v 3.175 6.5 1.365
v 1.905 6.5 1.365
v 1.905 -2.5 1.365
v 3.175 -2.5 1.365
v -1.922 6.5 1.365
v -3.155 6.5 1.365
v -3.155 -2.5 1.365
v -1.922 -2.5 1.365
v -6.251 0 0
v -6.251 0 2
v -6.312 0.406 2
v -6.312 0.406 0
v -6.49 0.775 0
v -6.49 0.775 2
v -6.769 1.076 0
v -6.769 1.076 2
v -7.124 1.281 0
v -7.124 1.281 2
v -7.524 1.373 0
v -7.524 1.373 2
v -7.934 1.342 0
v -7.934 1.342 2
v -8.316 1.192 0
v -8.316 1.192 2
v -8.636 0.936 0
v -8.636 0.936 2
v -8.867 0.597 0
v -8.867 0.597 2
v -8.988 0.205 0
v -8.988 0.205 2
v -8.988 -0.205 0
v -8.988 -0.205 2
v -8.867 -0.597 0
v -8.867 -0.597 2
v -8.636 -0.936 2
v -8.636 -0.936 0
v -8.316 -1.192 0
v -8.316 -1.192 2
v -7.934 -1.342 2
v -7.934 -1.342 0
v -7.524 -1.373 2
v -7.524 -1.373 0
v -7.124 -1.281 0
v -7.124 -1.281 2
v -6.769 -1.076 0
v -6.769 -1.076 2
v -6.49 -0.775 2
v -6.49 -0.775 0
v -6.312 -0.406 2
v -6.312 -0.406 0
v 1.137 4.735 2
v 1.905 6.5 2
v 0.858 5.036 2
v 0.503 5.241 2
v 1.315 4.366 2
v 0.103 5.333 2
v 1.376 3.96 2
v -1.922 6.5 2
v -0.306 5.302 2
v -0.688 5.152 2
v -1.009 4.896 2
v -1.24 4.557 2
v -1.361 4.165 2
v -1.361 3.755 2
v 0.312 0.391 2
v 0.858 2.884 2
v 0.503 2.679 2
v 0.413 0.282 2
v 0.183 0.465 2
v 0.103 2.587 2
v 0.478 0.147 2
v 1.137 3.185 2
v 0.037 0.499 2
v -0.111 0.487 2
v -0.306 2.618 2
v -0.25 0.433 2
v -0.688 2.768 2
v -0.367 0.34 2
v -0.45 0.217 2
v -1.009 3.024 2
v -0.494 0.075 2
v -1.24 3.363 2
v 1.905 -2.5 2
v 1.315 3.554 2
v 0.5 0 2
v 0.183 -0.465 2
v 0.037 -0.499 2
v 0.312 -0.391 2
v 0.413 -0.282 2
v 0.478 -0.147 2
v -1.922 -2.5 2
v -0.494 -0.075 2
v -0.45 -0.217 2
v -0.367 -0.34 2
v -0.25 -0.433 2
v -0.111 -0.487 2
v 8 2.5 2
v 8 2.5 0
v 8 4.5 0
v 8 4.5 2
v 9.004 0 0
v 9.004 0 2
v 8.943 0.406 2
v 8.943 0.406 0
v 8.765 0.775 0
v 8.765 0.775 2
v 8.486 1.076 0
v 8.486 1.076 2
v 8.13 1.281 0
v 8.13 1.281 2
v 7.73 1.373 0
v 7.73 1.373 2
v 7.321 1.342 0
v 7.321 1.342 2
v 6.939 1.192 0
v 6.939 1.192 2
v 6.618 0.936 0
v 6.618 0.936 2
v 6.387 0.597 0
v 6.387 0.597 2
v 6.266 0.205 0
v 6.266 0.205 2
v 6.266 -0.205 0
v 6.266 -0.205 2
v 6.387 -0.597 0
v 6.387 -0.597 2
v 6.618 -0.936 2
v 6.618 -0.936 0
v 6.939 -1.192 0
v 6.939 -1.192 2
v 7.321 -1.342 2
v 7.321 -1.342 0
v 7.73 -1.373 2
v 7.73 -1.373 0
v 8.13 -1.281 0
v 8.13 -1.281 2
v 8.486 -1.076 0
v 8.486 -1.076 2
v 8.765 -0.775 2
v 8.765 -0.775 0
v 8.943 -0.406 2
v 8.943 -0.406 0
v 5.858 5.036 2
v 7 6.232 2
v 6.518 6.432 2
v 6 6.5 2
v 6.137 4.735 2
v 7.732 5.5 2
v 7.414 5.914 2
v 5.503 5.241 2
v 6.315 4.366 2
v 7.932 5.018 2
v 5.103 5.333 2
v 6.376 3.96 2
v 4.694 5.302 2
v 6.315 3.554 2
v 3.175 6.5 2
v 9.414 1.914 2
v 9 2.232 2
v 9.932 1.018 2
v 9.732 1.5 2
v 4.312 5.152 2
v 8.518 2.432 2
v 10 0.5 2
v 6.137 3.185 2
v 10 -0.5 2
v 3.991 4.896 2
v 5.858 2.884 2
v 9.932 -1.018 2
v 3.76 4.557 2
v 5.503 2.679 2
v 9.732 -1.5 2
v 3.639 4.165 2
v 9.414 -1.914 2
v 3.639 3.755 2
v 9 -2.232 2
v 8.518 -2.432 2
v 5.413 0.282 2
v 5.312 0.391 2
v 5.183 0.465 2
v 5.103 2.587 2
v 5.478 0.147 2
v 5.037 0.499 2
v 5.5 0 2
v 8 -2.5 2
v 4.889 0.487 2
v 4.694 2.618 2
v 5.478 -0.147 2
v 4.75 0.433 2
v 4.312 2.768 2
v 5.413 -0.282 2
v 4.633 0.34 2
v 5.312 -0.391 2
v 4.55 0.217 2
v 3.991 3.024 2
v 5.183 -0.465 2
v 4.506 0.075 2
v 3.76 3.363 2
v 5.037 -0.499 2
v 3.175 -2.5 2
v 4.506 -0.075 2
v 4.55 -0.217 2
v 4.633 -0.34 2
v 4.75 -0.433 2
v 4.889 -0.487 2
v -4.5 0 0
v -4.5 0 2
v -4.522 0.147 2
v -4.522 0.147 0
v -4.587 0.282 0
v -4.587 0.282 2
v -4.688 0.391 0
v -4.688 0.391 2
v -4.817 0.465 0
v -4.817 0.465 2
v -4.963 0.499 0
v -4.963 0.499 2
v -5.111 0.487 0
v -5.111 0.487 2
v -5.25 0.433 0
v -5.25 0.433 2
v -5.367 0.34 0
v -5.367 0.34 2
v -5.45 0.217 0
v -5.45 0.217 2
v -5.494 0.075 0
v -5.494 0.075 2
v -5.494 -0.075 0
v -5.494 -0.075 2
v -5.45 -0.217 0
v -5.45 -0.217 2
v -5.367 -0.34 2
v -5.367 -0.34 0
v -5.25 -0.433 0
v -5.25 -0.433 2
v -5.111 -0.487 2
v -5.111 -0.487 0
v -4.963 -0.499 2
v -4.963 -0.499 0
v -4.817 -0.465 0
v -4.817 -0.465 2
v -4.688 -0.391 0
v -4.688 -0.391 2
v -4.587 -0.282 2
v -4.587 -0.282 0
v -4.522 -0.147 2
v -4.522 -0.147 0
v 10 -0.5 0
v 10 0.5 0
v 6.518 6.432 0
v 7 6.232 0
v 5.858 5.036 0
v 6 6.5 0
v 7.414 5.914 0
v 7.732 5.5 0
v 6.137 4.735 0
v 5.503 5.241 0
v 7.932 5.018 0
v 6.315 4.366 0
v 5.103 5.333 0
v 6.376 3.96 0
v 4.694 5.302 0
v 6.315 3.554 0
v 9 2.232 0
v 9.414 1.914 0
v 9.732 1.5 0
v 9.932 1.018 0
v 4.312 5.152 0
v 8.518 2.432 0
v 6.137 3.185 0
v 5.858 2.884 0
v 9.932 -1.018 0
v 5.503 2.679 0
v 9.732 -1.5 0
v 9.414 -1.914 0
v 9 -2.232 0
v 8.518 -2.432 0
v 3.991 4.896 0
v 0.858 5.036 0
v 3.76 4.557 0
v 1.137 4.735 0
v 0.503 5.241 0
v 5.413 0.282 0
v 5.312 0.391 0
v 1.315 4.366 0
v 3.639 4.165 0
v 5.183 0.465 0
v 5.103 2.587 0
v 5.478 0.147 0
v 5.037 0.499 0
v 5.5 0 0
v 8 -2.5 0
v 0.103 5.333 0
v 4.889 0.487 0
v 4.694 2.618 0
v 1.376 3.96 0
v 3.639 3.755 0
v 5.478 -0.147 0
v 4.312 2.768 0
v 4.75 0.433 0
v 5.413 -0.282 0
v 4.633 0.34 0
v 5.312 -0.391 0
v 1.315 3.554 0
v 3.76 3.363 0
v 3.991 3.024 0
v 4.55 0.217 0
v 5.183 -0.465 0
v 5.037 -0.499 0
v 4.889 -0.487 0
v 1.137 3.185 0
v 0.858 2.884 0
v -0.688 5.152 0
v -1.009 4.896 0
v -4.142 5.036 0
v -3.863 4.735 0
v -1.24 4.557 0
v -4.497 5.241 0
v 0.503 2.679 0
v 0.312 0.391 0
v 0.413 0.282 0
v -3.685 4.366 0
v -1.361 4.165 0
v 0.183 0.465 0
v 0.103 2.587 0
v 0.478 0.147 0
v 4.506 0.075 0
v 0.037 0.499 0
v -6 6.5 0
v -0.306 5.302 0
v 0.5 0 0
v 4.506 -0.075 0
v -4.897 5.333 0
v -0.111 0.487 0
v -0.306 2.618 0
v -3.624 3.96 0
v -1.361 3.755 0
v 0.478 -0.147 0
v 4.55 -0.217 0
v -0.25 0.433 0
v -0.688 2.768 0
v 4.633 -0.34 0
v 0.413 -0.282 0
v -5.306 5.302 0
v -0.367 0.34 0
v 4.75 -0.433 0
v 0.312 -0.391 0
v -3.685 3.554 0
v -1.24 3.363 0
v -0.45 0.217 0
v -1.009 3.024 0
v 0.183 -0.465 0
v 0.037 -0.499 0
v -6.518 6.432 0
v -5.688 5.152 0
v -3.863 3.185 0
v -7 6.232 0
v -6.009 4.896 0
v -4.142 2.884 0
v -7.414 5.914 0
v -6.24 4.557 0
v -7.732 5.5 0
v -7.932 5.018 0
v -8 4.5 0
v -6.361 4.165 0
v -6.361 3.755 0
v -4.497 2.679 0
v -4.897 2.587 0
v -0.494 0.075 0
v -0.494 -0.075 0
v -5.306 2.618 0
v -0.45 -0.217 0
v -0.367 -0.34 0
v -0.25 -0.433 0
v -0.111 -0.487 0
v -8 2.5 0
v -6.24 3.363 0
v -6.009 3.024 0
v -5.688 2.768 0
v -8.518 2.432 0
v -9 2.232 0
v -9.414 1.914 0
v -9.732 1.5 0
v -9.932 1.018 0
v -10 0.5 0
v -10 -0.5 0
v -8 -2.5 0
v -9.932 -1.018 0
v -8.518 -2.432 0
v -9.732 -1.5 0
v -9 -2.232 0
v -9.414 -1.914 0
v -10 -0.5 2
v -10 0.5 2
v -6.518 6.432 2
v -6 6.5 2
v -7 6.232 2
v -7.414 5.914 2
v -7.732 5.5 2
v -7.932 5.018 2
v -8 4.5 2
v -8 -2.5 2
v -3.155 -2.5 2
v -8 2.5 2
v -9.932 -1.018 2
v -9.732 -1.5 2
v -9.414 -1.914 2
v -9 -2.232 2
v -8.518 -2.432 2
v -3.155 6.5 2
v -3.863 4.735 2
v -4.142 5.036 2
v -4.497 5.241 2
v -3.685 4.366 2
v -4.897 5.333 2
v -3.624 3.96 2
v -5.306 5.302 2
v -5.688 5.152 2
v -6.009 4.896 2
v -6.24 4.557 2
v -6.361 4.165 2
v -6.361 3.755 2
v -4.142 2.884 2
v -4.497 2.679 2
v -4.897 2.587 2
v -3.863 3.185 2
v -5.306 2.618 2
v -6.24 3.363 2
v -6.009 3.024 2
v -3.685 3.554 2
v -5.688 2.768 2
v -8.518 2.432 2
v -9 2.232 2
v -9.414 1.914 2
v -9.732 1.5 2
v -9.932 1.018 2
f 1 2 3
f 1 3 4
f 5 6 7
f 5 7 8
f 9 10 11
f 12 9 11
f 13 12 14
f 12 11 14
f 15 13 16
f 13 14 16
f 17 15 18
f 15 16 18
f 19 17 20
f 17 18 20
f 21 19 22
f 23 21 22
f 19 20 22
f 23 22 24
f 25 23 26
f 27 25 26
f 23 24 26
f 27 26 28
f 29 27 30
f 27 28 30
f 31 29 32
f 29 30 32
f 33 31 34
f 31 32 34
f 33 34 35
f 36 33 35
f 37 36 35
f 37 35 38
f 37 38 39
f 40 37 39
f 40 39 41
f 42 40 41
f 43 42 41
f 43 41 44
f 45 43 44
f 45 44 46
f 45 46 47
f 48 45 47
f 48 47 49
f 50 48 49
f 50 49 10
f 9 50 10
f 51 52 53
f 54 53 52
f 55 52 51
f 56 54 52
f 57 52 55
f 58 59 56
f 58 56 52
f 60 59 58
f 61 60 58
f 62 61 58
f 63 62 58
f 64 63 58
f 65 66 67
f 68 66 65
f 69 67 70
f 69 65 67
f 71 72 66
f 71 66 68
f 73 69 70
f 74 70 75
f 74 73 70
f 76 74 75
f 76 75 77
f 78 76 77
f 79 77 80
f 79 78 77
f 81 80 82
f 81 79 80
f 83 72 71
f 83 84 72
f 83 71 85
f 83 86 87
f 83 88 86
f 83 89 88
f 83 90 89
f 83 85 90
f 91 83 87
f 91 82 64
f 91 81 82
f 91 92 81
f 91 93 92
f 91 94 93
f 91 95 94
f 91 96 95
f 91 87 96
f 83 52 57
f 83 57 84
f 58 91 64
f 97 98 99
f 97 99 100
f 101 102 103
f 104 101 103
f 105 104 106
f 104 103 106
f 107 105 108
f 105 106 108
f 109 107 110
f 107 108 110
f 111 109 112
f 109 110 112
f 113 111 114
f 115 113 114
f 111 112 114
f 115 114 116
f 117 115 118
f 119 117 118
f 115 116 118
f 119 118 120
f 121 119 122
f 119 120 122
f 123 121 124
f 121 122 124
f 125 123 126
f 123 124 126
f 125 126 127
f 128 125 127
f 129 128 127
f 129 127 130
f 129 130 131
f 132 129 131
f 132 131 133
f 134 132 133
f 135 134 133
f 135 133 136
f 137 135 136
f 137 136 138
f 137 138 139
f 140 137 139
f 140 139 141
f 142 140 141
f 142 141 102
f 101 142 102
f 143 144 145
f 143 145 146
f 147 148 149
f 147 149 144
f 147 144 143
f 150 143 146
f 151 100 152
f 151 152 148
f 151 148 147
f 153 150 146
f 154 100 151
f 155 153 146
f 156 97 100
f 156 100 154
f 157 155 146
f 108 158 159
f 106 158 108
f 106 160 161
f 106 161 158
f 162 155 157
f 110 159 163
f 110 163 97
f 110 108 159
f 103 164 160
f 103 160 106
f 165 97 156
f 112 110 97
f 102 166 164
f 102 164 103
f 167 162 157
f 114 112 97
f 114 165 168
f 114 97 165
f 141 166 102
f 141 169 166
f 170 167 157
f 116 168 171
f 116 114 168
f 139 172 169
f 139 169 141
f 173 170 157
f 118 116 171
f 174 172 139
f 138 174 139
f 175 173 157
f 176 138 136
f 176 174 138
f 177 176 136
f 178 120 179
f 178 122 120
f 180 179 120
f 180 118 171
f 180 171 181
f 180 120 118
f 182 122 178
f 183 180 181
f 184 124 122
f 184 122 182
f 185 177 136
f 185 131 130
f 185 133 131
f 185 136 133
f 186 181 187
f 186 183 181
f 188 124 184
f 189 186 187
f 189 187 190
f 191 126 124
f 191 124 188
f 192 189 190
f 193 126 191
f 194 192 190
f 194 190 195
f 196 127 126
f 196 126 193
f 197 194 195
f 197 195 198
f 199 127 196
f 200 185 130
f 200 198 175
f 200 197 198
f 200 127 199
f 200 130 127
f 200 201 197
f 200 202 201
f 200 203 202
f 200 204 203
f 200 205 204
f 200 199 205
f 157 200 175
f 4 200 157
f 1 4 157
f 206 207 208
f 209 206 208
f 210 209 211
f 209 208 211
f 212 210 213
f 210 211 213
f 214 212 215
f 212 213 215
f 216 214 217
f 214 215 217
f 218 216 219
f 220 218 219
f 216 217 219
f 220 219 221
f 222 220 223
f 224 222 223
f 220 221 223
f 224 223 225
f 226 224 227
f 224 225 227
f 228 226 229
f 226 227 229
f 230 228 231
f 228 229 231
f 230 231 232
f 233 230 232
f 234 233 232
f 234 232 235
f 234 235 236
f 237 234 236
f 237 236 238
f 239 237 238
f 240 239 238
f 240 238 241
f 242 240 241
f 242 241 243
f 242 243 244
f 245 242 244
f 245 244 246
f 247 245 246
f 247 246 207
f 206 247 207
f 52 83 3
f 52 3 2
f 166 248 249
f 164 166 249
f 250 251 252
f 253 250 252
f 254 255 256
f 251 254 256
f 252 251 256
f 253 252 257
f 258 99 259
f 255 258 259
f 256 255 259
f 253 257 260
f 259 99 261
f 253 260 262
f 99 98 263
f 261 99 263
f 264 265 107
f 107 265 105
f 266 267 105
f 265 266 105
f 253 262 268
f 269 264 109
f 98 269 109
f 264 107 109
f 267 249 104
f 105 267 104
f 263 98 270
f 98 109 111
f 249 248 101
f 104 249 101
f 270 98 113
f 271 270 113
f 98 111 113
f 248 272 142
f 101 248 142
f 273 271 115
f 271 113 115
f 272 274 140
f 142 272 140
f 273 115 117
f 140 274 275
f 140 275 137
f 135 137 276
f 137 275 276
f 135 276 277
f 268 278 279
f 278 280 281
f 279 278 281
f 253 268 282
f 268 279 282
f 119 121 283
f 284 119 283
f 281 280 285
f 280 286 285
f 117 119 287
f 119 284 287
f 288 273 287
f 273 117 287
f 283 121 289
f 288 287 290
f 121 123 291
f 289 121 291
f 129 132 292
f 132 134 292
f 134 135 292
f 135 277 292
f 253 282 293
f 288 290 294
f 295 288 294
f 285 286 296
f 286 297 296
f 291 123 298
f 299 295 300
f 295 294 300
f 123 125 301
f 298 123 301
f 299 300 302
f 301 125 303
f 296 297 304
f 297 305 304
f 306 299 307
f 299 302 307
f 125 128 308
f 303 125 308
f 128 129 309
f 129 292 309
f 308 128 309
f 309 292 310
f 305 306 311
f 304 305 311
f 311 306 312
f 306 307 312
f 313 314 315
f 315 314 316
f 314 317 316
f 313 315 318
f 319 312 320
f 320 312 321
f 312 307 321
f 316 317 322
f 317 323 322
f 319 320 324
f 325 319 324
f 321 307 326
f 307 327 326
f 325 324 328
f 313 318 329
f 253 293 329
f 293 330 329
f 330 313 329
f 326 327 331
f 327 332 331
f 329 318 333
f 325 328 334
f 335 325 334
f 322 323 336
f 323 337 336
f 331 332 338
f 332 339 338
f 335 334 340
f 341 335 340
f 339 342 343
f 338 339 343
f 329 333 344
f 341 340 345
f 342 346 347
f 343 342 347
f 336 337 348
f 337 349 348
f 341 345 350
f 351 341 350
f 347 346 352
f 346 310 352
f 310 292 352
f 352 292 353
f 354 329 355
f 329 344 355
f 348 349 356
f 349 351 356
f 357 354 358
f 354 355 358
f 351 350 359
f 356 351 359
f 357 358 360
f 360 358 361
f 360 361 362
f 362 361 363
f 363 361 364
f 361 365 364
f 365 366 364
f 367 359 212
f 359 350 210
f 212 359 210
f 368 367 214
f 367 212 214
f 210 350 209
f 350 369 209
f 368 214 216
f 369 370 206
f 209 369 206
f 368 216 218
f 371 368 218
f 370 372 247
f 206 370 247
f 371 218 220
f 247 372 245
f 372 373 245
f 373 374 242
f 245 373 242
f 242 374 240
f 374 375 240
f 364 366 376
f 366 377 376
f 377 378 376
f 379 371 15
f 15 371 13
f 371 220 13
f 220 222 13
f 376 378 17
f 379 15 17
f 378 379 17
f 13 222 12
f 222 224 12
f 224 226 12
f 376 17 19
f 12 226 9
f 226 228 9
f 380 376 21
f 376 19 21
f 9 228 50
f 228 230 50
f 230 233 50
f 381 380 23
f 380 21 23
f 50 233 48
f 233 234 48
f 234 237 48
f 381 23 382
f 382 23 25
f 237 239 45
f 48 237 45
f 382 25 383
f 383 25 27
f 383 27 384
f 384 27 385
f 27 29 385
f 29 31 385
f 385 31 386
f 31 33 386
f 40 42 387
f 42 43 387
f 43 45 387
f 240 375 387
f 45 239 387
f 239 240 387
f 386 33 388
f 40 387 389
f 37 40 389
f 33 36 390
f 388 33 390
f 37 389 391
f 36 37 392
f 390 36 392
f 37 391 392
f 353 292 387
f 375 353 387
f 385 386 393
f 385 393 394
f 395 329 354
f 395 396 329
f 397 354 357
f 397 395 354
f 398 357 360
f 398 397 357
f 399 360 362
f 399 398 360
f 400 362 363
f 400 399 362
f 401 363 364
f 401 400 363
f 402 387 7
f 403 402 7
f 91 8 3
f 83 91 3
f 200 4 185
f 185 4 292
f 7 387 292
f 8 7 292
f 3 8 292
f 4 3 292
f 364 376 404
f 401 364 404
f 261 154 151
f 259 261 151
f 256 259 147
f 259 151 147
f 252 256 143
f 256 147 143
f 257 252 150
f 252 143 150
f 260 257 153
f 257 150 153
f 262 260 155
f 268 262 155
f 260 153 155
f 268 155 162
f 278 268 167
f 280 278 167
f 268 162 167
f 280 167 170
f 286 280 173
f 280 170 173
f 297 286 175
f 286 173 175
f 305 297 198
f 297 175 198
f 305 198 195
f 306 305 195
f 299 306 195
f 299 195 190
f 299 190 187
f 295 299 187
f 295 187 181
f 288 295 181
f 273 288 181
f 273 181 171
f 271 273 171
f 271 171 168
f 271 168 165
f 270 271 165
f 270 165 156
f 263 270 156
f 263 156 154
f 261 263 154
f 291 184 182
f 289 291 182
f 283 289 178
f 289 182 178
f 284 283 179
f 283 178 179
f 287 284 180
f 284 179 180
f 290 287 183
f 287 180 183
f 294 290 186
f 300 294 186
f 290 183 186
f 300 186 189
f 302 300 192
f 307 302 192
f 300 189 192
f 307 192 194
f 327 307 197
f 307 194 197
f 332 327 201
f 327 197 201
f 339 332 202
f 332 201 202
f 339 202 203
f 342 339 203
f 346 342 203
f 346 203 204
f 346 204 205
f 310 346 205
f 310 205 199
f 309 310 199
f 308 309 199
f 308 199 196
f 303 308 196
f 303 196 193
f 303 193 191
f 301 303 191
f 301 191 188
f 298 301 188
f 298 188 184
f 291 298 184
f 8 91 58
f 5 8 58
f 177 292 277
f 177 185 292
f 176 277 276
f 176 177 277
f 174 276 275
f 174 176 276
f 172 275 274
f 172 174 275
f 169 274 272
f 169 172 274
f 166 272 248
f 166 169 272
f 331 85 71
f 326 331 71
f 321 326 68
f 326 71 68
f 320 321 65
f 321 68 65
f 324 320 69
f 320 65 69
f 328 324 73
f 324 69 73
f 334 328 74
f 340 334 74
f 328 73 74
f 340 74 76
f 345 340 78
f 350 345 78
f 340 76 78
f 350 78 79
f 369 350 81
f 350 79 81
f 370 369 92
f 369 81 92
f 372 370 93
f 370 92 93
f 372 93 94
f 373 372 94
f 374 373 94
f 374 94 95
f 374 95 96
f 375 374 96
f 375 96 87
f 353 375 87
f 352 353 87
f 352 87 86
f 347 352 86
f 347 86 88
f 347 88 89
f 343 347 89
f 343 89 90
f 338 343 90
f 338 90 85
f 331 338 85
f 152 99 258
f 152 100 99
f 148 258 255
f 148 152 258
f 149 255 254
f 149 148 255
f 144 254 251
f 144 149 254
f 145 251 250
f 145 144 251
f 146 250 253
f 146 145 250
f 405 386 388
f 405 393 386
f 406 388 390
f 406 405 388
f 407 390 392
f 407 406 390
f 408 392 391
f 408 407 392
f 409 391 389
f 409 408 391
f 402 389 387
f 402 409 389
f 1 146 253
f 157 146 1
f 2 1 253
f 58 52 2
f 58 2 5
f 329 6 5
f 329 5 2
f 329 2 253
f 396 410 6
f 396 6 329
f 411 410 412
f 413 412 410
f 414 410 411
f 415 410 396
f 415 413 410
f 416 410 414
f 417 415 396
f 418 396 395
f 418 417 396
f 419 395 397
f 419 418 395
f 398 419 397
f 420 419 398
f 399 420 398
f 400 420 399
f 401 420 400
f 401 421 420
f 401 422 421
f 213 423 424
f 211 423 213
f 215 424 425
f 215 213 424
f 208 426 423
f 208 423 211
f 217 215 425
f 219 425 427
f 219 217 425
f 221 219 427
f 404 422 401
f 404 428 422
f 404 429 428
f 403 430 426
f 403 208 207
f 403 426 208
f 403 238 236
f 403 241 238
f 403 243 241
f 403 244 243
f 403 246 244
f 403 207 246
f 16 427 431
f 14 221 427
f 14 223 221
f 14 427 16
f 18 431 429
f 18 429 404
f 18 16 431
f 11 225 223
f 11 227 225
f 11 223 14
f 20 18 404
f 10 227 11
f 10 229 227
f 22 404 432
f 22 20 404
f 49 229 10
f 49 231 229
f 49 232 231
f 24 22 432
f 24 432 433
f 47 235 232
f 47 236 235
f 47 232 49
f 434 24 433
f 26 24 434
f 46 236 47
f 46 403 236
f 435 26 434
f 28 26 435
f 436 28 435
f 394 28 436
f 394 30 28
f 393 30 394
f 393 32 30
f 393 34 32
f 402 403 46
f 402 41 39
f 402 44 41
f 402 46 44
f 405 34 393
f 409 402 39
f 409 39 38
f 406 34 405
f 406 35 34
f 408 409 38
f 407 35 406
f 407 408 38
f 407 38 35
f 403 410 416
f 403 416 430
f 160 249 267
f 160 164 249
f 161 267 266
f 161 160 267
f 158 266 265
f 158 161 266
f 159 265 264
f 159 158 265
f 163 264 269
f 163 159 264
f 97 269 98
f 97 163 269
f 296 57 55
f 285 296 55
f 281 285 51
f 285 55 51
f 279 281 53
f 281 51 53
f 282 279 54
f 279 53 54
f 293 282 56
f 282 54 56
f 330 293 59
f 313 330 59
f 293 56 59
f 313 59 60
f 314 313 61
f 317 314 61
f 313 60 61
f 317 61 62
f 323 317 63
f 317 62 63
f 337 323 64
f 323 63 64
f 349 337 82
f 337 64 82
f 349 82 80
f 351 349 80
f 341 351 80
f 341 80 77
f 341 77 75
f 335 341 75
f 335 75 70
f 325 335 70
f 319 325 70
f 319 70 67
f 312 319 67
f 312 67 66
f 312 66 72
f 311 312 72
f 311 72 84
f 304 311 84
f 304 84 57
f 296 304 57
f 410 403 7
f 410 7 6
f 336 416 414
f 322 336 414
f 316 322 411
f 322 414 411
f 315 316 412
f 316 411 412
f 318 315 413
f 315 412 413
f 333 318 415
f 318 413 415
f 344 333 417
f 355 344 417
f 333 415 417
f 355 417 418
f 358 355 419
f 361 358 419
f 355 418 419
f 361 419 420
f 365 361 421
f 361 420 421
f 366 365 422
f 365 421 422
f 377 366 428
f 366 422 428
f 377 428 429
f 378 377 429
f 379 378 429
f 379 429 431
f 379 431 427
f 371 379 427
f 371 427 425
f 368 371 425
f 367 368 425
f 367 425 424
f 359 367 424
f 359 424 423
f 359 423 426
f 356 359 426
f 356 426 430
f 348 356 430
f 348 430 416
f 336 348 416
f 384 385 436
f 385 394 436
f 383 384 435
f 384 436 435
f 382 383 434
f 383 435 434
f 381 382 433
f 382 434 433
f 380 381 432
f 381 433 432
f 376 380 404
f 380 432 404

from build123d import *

# Parameters (mm, degrees)
F0_W      = 20
F0_H      = 5
F1_DEPTH  = 2
F2_R      = 2
F3_W      = 16
F3_H      = 2
F4_DEPTH  = 4
F5_R      = 2
F6_R      = 0.5
F7_DEPTH  = 2.001
F8_R      = 1.376408
F9_DEPTH  = 2.001
F11_W     = 1.233603
F11_H     = 9
F10_W     = 1.27
F10_H     = 9
F12_DEPTH = 0.635


with BuildPart() as f1:
    # F0 (on Top) → F1 (new body)
    with BuildSketch(Plane.XY):
        Rectangle(F0_W, F0_H)
    extrude(amount=F1_DEPTH)

    # F2
    f2_edges = [f1.edges().sort_by_distance(p)[0] for p in [
        (-10, -2.5, 1),
        (-10, 2.5, 1),
        (10, 2.5, 1),
        (10, -2.5, 1),
    ]]
    fillet(f2_edges, radius=F2_R)

    # F3 (on face) → F4 (join)
    with BuildSketch(Plane(origin=(0, 2.5, 0), x_dir=(-1, 0, 0), z_dir=(0, 1, 0))):
        with Locations((0, 1)):
            Rectangle(F3_W, F3_H)
    extrude(amount=F4_DEPTH)

    # F5
    f5_edges = [f1.edges().sort_by_distance(p)[0] for p in [
        (-8, 6.5, 1),
        (8, 6.5, 1),
    ]]
    fillet(f5_edges, radius=F5_R)

    # F6 (on face) → F7 (cut, through all)
    with BuildSketch(Plane.XY.offset(2)):
        Circle(F6_R)
        with Locations((-5, 0)):
            Circle(F6_R)
        with Locations((5, 0)):
            Circle(F6_R)
    extrude(amount=-F7_DEPTH, mode=Mode.SUBTRACT)

    # F8 (on face) → F9 (cut, through all)
    with BuildSketch(Plane.XY.offset(2)):
        with Locations((-7.627351, 0)):
            Circle(F8_R)
        with Locations((7.627366, 0)):
            Circle(F8_R)
        with Locations((-5, 3.96)):
            Circle(F8_R)
        with Locations((0, 3.96)):
            Circle(F8_R)
        with Locations((5, 3.96)):
            Circle(F8_R)
    extrude(amount=-F9_DEPTH, mode=Mode.SUBTRACT)

    # F11 (on face) + F10 (on face) → F12 (cut)
    with BuildSketch(Plane.XY.offset(2)):
        with Locations((-2.538401, 2)):
            Rectangle(F11_W, F11_H)
    with BuildSketch(Plane.XY.offset(2)):
        with Locations((2.54, 2)):
            Rectangle(F10_W, F10_H)
    extrude(amount=-F12_DEPTH, mode=Mode.SUBTRACT)


solid = f1.part
